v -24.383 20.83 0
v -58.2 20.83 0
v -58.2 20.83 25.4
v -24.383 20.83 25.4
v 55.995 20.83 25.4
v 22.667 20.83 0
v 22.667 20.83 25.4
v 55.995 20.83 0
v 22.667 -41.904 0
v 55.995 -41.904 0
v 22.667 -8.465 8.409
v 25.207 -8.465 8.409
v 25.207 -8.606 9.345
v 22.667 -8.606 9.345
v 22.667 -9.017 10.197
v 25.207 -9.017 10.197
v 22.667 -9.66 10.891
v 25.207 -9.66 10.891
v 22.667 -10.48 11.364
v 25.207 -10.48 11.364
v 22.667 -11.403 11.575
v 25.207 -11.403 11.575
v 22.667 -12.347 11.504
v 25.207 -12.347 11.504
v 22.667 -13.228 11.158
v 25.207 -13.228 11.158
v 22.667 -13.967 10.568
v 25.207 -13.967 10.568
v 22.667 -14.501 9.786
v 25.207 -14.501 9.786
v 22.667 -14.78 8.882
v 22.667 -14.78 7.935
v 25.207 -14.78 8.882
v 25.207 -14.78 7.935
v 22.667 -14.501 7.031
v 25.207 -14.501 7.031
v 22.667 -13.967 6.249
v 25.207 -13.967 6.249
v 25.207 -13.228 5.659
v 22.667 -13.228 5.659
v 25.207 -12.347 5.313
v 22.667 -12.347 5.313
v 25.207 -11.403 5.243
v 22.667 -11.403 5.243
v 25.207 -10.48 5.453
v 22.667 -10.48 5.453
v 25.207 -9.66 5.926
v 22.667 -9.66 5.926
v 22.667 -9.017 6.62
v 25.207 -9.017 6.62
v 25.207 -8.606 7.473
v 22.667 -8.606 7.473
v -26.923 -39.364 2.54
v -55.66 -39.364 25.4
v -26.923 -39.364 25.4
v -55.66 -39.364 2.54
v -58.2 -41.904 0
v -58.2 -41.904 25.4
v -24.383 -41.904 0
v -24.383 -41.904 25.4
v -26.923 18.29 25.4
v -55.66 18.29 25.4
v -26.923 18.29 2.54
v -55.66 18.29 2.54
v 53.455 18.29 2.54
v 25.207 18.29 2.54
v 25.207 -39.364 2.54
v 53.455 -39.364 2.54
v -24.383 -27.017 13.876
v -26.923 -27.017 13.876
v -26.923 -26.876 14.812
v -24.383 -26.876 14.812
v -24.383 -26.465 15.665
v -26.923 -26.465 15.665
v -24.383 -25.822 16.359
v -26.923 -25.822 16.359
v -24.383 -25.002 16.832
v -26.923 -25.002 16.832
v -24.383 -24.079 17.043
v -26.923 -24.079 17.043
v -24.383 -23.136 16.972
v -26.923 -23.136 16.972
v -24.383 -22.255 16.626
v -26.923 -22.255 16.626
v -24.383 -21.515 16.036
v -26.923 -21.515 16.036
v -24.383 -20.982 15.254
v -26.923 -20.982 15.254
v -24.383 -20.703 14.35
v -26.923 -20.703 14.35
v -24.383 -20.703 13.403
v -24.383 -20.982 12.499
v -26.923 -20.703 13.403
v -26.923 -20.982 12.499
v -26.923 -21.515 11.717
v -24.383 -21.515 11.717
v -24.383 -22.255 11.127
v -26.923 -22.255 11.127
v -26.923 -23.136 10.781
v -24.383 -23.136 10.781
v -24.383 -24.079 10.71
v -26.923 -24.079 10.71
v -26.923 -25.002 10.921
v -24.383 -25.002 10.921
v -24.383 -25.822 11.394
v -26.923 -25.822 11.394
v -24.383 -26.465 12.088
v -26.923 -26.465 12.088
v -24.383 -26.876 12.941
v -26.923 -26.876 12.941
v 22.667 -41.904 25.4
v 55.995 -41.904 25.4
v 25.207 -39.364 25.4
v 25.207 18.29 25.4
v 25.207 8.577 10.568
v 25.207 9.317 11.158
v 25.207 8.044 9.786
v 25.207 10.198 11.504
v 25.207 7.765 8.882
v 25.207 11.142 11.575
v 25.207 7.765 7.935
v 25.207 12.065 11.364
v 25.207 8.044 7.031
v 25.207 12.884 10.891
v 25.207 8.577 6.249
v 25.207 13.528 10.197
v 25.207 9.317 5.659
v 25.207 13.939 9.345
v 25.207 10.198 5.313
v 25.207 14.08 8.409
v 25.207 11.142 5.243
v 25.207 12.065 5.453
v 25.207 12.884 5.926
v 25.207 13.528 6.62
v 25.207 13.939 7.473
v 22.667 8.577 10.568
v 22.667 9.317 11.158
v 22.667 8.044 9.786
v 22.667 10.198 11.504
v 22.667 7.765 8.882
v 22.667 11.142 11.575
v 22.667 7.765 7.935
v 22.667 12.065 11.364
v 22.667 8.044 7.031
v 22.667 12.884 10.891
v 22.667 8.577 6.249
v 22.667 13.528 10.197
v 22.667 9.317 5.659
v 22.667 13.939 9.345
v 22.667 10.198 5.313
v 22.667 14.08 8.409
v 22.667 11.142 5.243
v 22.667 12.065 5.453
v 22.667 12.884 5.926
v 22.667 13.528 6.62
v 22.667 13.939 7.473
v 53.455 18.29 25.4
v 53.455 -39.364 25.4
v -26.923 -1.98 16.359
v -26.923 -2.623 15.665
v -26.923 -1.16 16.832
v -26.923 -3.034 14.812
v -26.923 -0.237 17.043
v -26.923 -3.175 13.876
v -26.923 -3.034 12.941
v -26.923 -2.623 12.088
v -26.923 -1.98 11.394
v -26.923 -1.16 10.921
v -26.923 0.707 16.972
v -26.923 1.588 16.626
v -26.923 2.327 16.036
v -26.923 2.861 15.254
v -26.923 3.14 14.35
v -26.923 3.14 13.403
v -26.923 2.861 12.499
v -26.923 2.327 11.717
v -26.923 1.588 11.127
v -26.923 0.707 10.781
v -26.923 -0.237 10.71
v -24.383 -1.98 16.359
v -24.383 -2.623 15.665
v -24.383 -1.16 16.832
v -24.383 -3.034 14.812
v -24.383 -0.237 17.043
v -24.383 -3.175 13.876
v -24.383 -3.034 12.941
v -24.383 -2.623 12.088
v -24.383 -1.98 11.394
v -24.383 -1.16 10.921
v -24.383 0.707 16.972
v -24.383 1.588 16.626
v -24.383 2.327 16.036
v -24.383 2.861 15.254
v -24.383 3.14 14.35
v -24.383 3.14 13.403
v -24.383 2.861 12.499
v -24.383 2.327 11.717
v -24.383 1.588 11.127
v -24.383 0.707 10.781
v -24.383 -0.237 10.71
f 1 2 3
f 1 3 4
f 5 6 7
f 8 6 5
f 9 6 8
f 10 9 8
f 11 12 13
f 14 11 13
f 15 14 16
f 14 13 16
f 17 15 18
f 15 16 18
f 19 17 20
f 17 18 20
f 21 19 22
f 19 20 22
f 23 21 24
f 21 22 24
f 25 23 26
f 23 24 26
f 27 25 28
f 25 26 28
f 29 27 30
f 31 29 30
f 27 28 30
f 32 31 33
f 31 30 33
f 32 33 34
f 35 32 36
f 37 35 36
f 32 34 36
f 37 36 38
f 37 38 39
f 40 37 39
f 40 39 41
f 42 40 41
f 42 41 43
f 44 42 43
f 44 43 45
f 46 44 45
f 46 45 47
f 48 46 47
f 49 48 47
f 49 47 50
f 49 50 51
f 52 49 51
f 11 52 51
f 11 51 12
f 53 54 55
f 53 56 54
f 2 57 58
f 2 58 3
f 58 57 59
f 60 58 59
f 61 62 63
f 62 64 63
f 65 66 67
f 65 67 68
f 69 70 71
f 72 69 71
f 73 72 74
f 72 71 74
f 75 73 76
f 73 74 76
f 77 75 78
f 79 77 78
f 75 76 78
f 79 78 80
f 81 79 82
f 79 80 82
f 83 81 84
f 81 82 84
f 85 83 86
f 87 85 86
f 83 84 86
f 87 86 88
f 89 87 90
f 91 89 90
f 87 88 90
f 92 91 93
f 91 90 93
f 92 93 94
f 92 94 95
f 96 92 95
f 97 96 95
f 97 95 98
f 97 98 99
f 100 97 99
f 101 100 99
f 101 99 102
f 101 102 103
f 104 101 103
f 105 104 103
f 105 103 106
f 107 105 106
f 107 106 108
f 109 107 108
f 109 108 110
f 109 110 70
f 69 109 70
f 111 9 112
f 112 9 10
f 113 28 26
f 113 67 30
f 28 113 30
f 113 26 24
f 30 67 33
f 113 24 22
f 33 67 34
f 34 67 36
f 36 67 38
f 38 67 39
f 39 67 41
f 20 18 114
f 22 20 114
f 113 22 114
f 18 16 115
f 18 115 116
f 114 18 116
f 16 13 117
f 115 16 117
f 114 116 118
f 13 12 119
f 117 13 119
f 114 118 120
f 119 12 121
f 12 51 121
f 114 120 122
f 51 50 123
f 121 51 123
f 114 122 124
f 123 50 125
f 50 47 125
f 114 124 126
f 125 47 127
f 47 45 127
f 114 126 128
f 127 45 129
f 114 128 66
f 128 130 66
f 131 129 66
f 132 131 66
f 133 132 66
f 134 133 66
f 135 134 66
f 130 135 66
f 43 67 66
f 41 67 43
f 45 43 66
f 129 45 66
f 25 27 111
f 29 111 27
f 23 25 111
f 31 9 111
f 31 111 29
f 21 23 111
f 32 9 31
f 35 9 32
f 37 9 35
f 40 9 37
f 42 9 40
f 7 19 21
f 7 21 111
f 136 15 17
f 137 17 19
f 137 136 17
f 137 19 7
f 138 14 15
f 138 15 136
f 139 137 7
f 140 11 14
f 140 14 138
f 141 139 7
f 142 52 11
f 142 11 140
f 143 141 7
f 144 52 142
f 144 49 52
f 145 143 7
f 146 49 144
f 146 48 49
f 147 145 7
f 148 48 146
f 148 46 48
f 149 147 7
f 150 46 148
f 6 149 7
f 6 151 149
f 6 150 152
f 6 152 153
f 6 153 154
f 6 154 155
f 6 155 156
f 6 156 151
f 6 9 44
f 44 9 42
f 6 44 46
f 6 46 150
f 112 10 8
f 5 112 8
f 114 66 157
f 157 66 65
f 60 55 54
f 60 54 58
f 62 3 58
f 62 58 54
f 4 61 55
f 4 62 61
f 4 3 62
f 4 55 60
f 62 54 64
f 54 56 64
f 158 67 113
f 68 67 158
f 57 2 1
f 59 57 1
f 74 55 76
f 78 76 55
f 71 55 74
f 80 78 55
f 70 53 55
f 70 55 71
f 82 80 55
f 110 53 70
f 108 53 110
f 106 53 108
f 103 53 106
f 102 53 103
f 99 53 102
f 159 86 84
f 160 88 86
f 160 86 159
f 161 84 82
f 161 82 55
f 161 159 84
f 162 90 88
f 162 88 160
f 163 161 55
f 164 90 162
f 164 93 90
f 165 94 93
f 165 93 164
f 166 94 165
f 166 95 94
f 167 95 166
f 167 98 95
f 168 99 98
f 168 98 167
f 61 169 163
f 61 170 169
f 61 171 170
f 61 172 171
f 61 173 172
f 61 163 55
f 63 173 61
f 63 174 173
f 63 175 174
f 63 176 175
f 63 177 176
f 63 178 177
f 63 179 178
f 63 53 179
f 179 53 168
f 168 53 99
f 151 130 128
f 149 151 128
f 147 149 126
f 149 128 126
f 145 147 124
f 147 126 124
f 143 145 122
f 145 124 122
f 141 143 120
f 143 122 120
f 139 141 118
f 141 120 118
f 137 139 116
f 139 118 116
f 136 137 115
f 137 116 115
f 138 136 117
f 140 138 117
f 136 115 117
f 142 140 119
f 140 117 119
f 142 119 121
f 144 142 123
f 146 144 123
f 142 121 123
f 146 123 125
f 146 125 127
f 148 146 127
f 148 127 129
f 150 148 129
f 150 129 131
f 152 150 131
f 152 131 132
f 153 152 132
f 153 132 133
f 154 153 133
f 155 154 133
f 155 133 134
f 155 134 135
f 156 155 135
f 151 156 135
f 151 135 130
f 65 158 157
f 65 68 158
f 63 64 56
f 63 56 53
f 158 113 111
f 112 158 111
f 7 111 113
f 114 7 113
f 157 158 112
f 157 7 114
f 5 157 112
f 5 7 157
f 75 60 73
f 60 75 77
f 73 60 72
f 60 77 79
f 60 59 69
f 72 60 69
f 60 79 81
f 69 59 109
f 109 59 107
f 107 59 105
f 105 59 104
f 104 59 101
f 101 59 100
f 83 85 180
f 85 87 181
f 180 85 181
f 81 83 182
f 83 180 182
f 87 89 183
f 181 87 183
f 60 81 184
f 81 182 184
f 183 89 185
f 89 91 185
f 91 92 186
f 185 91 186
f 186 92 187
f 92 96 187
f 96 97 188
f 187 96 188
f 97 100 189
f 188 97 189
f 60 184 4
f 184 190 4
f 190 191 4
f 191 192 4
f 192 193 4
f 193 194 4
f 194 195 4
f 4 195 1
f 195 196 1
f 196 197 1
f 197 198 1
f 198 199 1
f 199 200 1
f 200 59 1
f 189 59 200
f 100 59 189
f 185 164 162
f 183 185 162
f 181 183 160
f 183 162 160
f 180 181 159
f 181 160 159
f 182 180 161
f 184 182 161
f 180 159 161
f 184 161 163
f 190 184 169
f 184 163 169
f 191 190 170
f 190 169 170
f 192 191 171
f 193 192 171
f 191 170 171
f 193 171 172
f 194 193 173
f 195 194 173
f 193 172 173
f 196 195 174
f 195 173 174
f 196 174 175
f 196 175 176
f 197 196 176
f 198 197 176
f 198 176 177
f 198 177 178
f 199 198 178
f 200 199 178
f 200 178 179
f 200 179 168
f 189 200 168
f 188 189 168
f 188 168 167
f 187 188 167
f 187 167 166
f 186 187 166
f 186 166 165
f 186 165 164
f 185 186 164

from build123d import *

# Parameters (mm, degrees)
F0_W     = 33.8173955679
F0_H     = 62.7337228507
F1_DEPTH = 25.4
F0_W_2   = 33.3272926509
F2_T     = -2.54
F4_D     = 6.35
F4_DEPTH = 12.7
F4_TIP   = 1.9077324654
F5_T     = -2.54
F7_D     = 6.35
F7_DEPTH = 12.7
F7_TIP   = 1.9077324654


with BuildPart() as f1:
    # F0 (on Top) → F1 (new body)
    with BuildSketch(Plane.XY):
        with Locations((-41.2915311754, -10.5373049155)):
            Rectangle(F0_W, F0_H)
    extrude(amount=F1_DEPTH)

    # F2
    f2_openings = [f1.faces().sort_by_distance(p)[0] for p in [
        (-41.291531, -10.537305, 25.4),
    ]]
    offset(amount=F2_T, openings=f2_openings)

    # F4
    with Locations(Plane.YZ.offset(-24.3828333914)):
        with Locations((-23.842105642, 13.876426965), (0, 13.876426965)):
            Hole(F4_D / 2, depth=F4_DEPTH)
            with Locations((0, 0, -(F4_DEPTH + F4_TIP / 2))):  # 118° drill point
                Cone(0, F4_D / 2, F4_TIP, mode=Mode.SUBTRACT)


with BuildPart() as f1b:
    # F0 (on Top) → F1, piece 2 (new body)
    with BuildSketch(Plane.XY):
        with Locations((39.331106469, -10.5373049155)):
            Rectangle(F0_W_2, F0_H)
    extrude(amount=F1_DEPTH)

    # F5
    f5_openings = [f1b.faces().sort_by_distance(p)[0] for p in [
        (39.331106, -10.537305, 25.4),
    ]]
    offset(amount=F5_T, openings=f5_openings)

    # F7 (one way)
    with BuildSketch(Plane.YZ.offset(25.2074601436)):
        with Locations((-11.6400457919, 8.4086805582), (10.9048858285, 8.4086805582)):
            Circle(F7_D / 2)
    extrude(amount=-F7_DEPTH, mode=Mode.SUBTRACT)
    with Locations(Plane.YZ.offset(25.2074601436)):
        with Locations((-11.6400457919, 8.4086805582), (10.9048858285, 8.4086805582)):
            with Locations((0, 0, -(F7_DEPTH + F7_TIP / 2))):  # 118° drill point
                Cone(0, F7_D / 2, F7_TIP, mode=Mode.SUBTRACT)


solid = Compound([f1.part, f1b.part])
